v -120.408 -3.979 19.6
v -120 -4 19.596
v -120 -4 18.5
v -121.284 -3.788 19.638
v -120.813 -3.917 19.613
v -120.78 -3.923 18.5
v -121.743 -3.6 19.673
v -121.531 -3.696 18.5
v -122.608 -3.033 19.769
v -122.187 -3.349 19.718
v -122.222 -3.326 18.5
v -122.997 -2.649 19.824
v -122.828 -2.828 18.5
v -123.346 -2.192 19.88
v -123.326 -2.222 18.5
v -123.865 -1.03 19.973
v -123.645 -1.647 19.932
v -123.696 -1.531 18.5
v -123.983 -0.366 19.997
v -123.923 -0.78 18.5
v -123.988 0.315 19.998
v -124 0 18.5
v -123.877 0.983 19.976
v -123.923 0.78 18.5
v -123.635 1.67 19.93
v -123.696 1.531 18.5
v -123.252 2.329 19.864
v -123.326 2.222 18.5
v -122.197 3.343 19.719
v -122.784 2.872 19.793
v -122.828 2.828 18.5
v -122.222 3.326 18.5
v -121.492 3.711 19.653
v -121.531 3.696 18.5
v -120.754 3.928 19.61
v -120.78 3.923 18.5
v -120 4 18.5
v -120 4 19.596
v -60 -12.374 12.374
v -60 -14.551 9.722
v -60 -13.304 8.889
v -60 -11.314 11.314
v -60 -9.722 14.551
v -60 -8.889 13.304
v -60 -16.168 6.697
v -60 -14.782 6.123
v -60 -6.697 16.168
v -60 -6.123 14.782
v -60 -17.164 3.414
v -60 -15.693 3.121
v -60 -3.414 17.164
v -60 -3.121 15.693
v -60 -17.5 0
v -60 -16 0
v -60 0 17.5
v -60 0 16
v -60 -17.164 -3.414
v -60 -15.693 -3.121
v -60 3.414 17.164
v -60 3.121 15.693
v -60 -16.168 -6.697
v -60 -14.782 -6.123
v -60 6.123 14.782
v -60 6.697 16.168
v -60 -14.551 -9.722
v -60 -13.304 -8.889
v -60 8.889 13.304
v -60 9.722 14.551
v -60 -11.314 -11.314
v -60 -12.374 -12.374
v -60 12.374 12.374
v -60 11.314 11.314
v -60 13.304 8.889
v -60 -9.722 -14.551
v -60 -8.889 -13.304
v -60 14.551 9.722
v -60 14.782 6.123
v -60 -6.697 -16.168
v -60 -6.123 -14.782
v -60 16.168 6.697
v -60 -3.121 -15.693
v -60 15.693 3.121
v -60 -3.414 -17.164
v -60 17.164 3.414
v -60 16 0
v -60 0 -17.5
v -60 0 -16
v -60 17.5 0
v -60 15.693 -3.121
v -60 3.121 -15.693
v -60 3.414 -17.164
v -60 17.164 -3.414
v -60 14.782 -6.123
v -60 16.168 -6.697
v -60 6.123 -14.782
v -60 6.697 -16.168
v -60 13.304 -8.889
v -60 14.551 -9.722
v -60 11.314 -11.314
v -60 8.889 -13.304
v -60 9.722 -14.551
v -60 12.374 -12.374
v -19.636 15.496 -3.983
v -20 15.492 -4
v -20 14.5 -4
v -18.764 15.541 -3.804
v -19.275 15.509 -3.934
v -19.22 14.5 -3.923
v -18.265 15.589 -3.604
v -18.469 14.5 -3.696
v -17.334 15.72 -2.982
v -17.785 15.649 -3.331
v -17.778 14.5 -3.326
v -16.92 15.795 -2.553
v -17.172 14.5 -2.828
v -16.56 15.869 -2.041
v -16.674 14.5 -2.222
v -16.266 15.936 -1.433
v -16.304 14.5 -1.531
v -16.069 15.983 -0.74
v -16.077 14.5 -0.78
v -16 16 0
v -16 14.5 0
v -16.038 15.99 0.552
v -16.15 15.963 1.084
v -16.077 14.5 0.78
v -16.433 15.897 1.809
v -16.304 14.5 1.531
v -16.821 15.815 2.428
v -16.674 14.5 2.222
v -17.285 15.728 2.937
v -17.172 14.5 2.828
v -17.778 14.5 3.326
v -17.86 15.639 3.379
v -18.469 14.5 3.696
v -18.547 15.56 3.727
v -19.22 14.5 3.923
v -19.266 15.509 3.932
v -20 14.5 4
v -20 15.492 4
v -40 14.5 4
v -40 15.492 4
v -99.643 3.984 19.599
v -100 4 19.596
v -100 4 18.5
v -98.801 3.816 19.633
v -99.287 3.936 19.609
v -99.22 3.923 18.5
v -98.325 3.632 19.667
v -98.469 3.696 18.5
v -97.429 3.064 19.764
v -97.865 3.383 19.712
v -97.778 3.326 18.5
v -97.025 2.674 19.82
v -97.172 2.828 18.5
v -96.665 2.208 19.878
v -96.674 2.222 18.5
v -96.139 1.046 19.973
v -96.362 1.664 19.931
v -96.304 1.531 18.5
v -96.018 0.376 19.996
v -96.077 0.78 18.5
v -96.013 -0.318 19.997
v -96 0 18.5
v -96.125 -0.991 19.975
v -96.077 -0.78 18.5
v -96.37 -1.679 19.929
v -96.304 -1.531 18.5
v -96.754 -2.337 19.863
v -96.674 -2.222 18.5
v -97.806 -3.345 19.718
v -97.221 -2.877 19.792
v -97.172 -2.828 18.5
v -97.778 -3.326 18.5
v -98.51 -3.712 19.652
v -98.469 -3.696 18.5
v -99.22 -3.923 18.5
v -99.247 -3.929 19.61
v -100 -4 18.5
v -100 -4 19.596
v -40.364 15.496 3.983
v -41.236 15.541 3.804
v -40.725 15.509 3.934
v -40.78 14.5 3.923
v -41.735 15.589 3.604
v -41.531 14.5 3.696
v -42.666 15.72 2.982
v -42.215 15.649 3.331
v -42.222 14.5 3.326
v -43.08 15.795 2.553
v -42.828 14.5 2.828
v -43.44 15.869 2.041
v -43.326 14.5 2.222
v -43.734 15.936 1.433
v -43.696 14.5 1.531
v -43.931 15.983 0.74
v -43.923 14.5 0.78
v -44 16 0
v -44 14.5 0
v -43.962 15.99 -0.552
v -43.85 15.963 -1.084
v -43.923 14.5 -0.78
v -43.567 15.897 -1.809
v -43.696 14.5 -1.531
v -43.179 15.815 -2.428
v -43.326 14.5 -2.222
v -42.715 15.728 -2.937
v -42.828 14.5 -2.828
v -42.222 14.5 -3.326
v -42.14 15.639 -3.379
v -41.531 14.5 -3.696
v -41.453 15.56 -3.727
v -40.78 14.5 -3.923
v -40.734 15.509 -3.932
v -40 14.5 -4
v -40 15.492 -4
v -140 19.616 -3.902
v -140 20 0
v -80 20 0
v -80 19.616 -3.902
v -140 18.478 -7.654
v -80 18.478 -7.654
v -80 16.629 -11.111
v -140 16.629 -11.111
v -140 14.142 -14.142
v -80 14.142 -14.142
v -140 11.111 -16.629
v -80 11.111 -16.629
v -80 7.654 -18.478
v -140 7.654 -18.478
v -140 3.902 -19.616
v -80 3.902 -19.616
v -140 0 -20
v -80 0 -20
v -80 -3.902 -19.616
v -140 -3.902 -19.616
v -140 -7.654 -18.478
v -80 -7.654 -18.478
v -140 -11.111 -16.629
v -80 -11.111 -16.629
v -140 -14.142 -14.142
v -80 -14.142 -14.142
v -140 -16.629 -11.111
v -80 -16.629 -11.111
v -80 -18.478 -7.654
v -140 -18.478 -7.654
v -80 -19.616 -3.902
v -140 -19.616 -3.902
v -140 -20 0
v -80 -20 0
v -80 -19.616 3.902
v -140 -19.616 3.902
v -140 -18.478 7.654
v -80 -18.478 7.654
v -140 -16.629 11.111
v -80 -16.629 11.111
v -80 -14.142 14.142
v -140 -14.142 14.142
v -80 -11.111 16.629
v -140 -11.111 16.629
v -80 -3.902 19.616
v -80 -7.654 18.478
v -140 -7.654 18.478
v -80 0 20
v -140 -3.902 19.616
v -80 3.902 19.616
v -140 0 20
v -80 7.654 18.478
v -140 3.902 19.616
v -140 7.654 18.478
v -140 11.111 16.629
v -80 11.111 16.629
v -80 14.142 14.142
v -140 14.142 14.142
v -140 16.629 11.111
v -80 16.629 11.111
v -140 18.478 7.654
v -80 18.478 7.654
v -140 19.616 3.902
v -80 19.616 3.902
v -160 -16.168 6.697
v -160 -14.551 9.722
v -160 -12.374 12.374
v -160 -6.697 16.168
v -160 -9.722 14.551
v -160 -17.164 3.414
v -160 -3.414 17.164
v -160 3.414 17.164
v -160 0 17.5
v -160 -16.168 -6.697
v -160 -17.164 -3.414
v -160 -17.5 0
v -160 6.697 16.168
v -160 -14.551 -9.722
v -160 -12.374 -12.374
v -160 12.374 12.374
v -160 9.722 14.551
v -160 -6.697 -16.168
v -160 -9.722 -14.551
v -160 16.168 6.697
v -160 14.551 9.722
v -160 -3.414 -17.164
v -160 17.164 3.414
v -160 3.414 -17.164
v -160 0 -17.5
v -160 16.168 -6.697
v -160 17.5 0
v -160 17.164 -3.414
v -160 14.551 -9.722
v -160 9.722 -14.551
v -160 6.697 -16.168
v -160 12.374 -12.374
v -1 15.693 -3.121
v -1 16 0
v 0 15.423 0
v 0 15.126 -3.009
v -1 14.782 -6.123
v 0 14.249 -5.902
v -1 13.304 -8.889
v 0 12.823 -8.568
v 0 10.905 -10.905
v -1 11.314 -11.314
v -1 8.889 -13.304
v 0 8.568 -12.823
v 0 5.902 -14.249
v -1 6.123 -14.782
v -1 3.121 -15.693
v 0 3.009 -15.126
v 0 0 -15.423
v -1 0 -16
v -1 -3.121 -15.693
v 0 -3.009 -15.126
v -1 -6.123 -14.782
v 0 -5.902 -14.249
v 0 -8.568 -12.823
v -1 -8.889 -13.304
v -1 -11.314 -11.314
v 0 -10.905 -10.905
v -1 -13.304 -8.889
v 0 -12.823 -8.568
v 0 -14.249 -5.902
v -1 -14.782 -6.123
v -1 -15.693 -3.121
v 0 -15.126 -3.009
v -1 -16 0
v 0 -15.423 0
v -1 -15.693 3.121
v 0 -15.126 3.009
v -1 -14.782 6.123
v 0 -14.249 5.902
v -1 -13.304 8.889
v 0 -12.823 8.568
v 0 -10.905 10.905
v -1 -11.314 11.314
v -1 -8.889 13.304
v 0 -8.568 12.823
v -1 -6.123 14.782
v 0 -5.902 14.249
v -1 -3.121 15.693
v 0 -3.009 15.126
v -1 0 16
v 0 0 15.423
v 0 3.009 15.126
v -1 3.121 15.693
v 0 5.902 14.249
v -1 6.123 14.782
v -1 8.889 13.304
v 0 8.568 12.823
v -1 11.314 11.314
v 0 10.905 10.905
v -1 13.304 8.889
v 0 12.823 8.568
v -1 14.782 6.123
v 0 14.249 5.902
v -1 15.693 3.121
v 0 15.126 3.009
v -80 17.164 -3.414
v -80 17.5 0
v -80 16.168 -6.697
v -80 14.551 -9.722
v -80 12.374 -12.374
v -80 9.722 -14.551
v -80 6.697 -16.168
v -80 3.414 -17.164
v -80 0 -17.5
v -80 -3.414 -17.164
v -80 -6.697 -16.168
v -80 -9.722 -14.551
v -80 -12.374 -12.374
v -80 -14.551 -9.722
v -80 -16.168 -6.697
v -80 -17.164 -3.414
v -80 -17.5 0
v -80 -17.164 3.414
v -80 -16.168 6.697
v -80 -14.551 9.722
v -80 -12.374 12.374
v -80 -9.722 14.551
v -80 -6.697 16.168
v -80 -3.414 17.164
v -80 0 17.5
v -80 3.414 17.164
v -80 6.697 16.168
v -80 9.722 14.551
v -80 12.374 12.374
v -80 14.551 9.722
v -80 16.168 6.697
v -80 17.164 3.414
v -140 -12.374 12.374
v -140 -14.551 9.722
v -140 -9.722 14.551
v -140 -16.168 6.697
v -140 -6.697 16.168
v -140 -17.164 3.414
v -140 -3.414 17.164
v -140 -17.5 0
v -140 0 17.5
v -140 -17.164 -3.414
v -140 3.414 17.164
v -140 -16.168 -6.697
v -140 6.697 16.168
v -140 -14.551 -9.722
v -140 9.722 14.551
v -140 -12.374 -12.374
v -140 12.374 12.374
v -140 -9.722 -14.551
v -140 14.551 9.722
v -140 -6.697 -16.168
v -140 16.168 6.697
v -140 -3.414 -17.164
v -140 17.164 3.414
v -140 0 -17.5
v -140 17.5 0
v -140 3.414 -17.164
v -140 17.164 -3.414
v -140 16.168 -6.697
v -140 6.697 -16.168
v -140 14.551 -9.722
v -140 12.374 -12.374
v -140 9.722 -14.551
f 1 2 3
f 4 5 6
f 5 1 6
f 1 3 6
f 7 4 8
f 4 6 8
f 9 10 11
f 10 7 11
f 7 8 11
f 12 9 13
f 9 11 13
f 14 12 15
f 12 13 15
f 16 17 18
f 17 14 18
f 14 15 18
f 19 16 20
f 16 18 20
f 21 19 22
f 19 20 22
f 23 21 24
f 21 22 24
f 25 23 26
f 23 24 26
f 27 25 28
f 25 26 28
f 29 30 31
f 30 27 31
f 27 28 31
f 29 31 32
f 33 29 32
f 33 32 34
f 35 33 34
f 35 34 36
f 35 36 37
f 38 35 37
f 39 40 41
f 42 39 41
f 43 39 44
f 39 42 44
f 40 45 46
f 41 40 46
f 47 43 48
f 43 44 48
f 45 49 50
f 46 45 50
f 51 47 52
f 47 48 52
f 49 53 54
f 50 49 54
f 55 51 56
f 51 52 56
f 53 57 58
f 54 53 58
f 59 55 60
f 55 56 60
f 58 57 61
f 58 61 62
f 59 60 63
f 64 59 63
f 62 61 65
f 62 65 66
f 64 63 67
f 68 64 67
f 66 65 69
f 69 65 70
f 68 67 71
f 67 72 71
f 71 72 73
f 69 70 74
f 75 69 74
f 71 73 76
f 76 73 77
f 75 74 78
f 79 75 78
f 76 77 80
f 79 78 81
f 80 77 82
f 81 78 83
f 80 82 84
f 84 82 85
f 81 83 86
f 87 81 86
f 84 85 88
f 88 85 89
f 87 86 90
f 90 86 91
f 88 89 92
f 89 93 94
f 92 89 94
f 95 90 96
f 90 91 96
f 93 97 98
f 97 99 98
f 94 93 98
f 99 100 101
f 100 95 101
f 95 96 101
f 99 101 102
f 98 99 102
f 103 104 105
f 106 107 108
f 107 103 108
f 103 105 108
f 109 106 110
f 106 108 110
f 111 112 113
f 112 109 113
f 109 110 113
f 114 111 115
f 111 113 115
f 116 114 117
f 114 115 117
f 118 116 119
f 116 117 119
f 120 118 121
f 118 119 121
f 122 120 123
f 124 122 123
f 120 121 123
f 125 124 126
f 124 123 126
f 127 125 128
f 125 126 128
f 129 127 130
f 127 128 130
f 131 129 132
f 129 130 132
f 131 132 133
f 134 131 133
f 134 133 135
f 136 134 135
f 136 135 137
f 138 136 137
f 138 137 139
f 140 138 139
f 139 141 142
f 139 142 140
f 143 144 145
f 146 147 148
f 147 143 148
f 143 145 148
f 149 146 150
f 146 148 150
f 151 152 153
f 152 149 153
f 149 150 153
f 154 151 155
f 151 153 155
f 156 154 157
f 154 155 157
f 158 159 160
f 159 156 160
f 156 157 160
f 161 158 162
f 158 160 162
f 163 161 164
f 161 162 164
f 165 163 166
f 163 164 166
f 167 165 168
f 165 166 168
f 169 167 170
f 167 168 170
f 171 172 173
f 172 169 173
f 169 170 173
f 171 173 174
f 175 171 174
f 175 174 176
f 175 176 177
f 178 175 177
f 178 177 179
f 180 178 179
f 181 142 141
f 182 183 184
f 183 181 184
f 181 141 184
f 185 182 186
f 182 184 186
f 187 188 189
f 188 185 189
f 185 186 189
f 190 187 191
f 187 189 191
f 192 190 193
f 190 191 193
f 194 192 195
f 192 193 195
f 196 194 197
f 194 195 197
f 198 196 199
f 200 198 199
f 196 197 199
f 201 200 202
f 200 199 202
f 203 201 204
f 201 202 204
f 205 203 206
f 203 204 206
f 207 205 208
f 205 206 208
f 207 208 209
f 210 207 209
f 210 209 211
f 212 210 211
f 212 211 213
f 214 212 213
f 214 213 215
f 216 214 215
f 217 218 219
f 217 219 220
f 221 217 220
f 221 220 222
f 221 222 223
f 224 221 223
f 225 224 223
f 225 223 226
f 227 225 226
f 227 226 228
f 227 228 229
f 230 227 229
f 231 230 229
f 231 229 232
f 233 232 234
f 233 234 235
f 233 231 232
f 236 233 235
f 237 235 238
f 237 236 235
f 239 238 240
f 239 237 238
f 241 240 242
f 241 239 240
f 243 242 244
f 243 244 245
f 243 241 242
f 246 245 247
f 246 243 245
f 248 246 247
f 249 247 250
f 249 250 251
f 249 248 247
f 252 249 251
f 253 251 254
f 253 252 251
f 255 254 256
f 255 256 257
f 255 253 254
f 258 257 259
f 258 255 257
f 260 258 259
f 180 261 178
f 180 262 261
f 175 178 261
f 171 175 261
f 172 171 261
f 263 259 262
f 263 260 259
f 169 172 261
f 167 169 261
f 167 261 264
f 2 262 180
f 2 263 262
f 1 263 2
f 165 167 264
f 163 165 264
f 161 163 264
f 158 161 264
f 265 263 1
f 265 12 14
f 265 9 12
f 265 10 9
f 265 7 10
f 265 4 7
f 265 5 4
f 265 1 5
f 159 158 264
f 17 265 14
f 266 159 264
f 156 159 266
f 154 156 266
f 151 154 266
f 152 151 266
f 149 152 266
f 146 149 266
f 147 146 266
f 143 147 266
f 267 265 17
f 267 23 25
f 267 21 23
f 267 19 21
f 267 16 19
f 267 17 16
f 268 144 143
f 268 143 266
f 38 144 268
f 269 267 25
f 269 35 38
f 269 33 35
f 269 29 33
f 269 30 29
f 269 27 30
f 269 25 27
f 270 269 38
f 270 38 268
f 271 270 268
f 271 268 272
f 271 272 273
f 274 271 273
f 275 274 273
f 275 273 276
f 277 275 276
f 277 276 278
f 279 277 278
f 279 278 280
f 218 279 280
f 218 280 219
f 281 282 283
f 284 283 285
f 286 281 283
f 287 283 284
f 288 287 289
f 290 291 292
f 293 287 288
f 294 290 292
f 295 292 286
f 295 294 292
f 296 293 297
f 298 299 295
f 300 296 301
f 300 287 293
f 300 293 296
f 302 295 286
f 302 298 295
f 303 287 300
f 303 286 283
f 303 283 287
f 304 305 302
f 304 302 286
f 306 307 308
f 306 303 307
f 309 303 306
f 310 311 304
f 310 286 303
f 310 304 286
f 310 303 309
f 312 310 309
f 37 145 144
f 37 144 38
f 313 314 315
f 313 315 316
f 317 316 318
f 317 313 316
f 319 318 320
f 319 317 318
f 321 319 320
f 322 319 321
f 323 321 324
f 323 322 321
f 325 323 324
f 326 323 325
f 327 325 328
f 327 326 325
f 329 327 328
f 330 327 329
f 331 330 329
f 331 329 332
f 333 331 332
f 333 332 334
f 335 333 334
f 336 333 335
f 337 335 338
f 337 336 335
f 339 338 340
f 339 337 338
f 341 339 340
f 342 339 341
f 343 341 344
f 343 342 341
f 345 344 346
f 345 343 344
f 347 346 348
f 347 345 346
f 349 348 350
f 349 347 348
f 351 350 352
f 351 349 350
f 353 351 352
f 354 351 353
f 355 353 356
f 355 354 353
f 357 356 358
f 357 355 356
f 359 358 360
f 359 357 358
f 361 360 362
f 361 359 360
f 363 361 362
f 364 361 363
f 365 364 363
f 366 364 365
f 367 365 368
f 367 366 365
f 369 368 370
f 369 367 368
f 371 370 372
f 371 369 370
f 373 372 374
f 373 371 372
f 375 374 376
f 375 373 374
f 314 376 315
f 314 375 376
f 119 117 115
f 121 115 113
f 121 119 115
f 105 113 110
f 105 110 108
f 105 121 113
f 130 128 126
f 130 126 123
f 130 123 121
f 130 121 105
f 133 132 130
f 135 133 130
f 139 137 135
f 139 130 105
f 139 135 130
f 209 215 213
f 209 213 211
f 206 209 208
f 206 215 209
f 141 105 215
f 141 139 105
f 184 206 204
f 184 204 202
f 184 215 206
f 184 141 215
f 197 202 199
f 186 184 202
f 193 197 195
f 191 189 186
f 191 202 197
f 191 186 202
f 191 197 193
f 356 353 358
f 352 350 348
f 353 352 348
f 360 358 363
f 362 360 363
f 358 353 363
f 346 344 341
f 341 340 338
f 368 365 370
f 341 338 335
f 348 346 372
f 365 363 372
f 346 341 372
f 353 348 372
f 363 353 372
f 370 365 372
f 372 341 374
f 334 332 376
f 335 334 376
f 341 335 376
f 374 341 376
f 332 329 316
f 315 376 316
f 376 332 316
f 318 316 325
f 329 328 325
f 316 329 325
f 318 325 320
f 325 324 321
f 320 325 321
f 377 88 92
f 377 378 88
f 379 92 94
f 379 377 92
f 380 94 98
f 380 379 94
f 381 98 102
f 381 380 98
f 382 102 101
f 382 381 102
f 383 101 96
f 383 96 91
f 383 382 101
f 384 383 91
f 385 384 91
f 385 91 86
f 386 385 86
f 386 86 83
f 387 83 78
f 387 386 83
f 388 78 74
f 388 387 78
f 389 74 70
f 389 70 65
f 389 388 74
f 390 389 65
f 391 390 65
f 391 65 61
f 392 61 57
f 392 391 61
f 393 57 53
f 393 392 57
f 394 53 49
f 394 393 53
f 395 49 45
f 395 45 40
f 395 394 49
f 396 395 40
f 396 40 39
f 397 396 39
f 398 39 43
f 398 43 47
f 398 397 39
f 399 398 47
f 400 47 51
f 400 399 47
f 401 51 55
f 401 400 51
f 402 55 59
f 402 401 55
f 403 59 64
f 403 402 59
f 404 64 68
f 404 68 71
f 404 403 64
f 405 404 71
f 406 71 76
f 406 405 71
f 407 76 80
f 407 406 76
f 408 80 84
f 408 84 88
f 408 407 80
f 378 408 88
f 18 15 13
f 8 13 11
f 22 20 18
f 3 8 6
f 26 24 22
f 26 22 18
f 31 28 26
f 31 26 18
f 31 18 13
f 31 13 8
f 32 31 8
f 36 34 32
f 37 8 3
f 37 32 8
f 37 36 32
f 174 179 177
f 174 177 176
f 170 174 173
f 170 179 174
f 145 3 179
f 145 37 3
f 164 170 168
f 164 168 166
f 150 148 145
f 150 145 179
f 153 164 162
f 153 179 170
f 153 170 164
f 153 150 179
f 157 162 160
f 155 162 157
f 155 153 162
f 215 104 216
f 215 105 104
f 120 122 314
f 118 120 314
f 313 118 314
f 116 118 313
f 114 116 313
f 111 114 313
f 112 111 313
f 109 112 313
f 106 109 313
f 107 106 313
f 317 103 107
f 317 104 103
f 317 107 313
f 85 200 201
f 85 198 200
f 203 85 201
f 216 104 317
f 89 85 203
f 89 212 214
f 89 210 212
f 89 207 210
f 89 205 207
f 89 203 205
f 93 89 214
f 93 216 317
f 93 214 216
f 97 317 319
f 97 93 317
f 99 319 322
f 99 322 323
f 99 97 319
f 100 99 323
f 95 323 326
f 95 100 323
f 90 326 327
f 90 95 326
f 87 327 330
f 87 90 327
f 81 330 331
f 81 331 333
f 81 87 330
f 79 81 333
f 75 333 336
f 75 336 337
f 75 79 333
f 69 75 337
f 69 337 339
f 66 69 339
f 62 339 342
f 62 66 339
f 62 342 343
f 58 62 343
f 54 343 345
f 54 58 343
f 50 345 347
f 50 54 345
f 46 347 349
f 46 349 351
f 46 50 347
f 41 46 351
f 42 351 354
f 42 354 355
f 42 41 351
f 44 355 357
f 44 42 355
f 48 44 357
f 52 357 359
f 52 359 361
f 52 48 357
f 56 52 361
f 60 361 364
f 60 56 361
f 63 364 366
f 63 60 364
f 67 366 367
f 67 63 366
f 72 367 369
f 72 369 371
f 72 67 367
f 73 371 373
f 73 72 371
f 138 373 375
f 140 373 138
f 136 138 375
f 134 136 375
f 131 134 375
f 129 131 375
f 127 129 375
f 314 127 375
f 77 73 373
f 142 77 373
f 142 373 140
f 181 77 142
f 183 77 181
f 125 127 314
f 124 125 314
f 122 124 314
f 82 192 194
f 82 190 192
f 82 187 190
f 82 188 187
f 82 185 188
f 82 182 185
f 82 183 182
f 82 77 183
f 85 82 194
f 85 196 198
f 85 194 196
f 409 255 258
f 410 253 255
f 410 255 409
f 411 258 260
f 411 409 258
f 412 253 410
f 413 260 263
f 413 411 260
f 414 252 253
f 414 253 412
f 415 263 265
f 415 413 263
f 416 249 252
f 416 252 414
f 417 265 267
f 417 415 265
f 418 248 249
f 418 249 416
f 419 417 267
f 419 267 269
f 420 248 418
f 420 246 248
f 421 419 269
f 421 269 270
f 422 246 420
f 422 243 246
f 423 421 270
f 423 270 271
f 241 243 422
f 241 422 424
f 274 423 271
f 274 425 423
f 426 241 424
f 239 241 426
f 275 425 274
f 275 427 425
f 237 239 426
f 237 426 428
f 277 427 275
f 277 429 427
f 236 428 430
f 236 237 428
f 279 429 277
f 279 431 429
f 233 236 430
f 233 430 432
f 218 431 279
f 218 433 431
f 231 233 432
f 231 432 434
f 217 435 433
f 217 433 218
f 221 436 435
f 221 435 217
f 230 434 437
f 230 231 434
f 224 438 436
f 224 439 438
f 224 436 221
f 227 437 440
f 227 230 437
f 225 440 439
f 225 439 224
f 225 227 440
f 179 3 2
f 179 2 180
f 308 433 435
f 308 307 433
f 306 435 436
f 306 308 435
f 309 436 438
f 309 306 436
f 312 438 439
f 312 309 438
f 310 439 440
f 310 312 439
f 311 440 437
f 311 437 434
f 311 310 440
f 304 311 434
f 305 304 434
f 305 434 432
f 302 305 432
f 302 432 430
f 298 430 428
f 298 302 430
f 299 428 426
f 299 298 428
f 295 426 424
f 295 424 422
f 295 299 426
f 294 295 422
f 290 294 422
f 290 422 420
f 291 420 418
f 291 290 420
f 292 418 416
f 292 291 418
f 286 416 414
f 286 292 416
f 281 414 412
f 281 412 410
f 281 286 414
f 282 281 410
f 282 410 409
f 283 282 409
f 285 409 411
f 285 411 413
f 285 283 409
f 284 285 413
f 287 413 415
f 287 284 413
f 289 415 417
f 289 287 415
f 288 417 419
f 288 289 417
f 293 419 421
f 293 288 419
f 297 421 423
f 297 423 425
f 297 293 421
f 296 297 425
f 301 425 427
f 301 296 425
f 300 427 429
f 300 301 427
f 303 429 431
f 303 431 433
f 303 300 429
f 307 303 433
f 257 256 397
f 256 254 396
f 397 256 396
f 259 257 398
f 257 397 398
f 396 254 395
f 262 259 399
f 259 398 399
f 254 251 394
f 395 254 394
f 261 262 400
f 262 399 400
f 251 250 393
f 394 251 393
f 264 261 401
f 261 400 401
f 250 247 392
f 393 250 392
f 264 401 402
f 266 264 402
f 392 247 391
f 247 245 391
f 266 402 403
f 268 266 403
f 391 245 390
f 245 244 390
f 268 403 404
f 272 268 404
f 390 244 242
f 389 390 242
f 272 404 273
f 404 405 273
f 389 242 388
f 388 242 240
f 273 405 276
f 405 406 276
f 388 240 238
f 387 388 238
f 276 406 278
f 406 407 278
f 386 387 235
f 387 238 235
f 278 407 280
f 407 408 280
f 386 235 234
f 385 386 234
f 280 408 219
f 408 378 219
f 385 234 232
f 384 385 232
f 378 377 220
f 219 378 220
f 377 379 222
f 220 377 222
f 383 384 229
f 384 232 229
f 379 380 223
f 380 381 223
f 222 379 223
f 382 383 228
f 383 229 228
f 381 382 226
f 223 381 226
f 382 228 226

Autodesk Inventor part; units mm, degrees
ref_plane "YZ Plane" through (0, 0, 0) normal (1, 0, 0) x (0, 1, 0)
sketch "Эскиз1" plane through (0, 0, 0) normal (0, 0, 1) x (1, 0, 0)
  line L0 (0, 0) -> (-160, 0)
  line L1 (0, 0) -> (0, 15.4226)
  line L2 (0, 15.4226) -> (-1, 16)
  line L3 (-1, 16) -> (-60, 16)
  line L4 (-60, 16) -> (-60, 17.5)
  line L5 (-60, 17.5) -> (-80, 17.5)
  line L6 (-80, 17.5) -> (-80, 20)
  line L7 (-80, 20) -> (-140, 20)
  line L8 (-140, 20) -> (-140, 17.5)
  line L9 (-140, 17.5) -> (-160, 17.5)
  line L10 (-160, 17.5) -> (-160, 0)
  dimension "d0" = 160
  dimension "d1" = 32
  dimension "d2" = 30
  dimension "d3" = 1
  dimension "d4" = 60
  dimension "d5" = 35
  dimension "d6" = 20
  dimension "d7" = 40
revolve "Вращение1" add sketch "Эскиз1" angle 360 about axis through (0, 0, 0) along (-1, 0, 0)
ref_plane "РабПлоскость1" through (0, 14.5, 0) normal (0, 1, 0) x (-1, 0, 0)
ref_plane "РабПлоскость2" through (0, 0, 18.5) normal (0, 0, 1) x (1, 0, 0)
sketch "Эскиз3" plane through (0, 14.5, 0) normal (0, 1, 0) x (-1, 0, 0)
  line L0 (0, 15.4226) -> (0, -15.4226) projected
  line L1 (80, 20) -> (80, -20) projected
  line L2 (140, 20) -> (140, -20) projected
  line L3 (44, 0) -> (16, 0) construction
  line L4 (40, 4) -> (20, 4)
  line L5 (20, -4) -> (40, -4)
  arc A0 (40, -4) -> (40, 4) centre (40, 0) ccw
  arc A1 (20, 4) -> (20, -4) centre (20, 0) ccw
  point P0 (0, 0)
  point P1 (30, 0)
  point P2 (80, 0)
  dimension "d11" = 20
  dimension "d12" = 8
  dimension "d13" = 50
extrude "Выдавливание1" cut sketch "Эскиз3" along normal through all
sketch "Эскиз4" plane through (0, 0, 18.5) normal (0, 0, 1) x (1, 0, 0)
  line L0 (-124, 0) -> (-96, 0) construction
  line L1 (-120, -4) -> (-100, -4)
  line L2 (-100, 4) -> (-120, 4)
  arc A0 (-120, 4) -> (-120, -4) centre (-120, 0) ccw
  arc A1 (-100, -4) -> (-100, 4) centre (-100, 0) ccw
  line L3 (-80, -17.5) -> (-80, 17.5) projected
  point P0 (0, 0)
  point P1 (-110, 0)
  point P2 (-80, 0)
  dimension "d16" = 20
  dimension "d17" = 8
  dimension "d18" = 30
extrude "Выдавливание2" cut sketch "Эскиз4" along normal through all
properties part number "Shaft1"
